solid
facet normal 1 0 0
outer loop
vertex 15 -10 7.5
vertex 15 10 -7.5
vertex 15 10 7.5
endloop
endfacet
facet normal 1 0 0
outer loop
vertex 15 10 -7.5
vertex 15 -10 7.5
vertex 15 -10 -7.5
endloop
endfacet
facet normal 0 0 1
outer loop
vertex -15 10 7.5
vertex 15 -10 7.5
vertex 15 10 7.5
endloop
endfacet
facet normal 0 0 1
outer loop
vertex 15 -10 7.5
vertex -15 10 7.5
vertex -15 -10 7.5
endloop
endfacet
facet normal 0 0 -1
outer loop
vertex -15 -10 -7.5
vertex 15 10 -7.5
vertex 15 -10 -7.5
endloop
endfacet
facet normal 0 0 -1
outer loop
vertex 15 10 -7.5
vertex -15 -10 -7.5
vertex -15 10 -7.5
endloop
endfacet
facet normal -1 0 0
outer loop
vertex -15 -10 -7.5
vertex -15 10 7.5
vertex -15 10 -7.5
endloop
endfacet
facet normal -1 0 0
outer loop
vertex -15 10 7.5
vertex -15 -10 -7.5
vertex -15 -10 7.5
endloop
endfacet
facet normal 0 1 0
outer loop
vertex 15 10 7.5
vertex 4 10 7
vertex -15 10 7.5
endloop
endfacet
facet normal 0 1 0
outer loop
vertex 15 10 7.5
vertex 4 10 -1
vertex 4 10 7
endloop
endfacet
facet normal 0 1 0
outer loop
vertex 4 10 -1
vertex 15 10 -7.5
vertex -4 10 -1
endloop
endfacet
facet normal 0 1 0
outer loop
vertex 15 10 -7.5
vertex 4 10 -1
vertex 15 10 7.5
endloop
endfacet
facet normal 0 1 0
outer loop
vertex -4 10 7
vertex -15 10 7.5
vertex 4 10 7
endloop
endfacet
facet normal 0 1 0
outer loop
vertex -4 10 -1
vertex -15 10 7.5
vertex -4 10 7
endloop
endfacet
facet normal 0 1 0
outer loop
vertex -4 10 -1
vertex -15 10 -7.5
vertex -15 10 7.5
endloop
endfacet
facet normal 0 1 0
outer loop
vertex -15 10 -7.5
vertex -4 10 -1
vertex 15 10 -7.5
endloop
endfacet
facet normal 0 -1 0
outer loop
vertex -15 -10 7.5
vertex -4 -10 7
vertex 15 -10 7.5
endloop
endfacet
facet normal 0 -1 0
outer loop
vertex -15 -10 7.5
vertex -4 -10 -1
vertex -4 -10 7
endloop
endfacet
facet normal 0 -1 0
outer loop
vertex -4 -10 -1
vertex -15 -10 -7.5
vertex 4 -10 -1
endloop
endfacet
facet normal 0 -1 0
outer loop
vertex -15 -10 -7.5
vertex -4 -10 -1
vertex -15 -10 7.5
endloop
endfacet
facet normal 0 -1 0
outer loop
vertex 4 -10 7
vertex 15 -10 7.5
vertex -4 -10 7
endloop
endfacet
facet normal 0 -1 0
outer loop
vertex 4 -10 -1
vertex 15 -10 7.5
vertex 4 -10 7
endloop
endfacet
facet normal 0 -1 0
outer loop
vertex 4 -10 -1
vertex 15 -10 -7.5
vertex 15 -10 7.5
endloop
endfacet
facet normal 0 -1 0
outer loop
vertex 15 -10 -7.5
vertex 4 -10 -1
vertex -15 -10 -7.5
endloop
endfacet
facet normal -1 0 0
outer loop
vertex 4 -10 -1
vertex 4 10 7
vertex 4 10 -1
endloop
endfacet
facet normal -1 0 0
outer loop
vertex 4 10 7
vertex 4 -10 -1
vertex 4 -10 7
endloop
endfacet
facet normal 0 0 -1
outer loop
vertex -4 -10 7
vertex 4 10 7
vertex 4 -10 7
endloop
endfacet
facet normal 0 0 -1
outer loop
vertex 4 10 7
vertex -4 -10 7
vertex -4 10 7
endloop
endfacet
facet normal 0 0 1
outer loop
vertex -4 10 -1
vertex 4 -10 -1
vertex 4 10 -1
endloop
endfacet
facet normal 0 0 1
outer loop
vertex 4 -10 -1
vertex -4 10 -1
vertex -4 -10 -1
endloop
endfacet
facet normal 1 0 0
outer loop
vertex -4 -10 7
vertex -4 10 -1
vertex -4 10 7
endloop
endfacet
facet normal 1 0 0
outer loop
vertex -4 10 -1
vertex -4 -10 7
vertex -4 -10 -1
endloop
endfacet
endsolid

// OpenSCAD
// Auto-generated from tests/data/feature_fixtures_manifest.json
// fixture: box_side_cutout
// fixture_type: box
// description: Box with a rectangular channel cut through both Y faces. Tests through-cutout on a side face.
$fn = 96;

box_size = [30.000000, 20.000000, 15.000000];
box_origin = [-15.000000, -10.000000, -7.500000];

module through_hole_x(center, diameter, length) {
  translate([box_origin[0] - 0.1, center[1], center[2]])
    rotate(a=90, v=[0, 1, 0]) cylinder(d=diameter, h=length, center=false);
}

module through_hole_y(center, diameter, length) {
  translate([center[0], box_origin[1] - 0.1, center[2]])
    rotate(a=90, v=[-1, 0, 0]) cylinder(d=diameter, h=length, center=false);
}

module through_hole_z(center, diameter, length) {
  translate([center[0], center[1], box_origin[2] - 0.1])
    cylinder(d=diameter, h=length, center=false);
}

difference() {
  translate(box_origin) cube(box_size);
  translate([-4.000000, -10.000000, -1.000000]) cube([8.000000, 20.000000, 8.000000]);  // cutout_0
}
